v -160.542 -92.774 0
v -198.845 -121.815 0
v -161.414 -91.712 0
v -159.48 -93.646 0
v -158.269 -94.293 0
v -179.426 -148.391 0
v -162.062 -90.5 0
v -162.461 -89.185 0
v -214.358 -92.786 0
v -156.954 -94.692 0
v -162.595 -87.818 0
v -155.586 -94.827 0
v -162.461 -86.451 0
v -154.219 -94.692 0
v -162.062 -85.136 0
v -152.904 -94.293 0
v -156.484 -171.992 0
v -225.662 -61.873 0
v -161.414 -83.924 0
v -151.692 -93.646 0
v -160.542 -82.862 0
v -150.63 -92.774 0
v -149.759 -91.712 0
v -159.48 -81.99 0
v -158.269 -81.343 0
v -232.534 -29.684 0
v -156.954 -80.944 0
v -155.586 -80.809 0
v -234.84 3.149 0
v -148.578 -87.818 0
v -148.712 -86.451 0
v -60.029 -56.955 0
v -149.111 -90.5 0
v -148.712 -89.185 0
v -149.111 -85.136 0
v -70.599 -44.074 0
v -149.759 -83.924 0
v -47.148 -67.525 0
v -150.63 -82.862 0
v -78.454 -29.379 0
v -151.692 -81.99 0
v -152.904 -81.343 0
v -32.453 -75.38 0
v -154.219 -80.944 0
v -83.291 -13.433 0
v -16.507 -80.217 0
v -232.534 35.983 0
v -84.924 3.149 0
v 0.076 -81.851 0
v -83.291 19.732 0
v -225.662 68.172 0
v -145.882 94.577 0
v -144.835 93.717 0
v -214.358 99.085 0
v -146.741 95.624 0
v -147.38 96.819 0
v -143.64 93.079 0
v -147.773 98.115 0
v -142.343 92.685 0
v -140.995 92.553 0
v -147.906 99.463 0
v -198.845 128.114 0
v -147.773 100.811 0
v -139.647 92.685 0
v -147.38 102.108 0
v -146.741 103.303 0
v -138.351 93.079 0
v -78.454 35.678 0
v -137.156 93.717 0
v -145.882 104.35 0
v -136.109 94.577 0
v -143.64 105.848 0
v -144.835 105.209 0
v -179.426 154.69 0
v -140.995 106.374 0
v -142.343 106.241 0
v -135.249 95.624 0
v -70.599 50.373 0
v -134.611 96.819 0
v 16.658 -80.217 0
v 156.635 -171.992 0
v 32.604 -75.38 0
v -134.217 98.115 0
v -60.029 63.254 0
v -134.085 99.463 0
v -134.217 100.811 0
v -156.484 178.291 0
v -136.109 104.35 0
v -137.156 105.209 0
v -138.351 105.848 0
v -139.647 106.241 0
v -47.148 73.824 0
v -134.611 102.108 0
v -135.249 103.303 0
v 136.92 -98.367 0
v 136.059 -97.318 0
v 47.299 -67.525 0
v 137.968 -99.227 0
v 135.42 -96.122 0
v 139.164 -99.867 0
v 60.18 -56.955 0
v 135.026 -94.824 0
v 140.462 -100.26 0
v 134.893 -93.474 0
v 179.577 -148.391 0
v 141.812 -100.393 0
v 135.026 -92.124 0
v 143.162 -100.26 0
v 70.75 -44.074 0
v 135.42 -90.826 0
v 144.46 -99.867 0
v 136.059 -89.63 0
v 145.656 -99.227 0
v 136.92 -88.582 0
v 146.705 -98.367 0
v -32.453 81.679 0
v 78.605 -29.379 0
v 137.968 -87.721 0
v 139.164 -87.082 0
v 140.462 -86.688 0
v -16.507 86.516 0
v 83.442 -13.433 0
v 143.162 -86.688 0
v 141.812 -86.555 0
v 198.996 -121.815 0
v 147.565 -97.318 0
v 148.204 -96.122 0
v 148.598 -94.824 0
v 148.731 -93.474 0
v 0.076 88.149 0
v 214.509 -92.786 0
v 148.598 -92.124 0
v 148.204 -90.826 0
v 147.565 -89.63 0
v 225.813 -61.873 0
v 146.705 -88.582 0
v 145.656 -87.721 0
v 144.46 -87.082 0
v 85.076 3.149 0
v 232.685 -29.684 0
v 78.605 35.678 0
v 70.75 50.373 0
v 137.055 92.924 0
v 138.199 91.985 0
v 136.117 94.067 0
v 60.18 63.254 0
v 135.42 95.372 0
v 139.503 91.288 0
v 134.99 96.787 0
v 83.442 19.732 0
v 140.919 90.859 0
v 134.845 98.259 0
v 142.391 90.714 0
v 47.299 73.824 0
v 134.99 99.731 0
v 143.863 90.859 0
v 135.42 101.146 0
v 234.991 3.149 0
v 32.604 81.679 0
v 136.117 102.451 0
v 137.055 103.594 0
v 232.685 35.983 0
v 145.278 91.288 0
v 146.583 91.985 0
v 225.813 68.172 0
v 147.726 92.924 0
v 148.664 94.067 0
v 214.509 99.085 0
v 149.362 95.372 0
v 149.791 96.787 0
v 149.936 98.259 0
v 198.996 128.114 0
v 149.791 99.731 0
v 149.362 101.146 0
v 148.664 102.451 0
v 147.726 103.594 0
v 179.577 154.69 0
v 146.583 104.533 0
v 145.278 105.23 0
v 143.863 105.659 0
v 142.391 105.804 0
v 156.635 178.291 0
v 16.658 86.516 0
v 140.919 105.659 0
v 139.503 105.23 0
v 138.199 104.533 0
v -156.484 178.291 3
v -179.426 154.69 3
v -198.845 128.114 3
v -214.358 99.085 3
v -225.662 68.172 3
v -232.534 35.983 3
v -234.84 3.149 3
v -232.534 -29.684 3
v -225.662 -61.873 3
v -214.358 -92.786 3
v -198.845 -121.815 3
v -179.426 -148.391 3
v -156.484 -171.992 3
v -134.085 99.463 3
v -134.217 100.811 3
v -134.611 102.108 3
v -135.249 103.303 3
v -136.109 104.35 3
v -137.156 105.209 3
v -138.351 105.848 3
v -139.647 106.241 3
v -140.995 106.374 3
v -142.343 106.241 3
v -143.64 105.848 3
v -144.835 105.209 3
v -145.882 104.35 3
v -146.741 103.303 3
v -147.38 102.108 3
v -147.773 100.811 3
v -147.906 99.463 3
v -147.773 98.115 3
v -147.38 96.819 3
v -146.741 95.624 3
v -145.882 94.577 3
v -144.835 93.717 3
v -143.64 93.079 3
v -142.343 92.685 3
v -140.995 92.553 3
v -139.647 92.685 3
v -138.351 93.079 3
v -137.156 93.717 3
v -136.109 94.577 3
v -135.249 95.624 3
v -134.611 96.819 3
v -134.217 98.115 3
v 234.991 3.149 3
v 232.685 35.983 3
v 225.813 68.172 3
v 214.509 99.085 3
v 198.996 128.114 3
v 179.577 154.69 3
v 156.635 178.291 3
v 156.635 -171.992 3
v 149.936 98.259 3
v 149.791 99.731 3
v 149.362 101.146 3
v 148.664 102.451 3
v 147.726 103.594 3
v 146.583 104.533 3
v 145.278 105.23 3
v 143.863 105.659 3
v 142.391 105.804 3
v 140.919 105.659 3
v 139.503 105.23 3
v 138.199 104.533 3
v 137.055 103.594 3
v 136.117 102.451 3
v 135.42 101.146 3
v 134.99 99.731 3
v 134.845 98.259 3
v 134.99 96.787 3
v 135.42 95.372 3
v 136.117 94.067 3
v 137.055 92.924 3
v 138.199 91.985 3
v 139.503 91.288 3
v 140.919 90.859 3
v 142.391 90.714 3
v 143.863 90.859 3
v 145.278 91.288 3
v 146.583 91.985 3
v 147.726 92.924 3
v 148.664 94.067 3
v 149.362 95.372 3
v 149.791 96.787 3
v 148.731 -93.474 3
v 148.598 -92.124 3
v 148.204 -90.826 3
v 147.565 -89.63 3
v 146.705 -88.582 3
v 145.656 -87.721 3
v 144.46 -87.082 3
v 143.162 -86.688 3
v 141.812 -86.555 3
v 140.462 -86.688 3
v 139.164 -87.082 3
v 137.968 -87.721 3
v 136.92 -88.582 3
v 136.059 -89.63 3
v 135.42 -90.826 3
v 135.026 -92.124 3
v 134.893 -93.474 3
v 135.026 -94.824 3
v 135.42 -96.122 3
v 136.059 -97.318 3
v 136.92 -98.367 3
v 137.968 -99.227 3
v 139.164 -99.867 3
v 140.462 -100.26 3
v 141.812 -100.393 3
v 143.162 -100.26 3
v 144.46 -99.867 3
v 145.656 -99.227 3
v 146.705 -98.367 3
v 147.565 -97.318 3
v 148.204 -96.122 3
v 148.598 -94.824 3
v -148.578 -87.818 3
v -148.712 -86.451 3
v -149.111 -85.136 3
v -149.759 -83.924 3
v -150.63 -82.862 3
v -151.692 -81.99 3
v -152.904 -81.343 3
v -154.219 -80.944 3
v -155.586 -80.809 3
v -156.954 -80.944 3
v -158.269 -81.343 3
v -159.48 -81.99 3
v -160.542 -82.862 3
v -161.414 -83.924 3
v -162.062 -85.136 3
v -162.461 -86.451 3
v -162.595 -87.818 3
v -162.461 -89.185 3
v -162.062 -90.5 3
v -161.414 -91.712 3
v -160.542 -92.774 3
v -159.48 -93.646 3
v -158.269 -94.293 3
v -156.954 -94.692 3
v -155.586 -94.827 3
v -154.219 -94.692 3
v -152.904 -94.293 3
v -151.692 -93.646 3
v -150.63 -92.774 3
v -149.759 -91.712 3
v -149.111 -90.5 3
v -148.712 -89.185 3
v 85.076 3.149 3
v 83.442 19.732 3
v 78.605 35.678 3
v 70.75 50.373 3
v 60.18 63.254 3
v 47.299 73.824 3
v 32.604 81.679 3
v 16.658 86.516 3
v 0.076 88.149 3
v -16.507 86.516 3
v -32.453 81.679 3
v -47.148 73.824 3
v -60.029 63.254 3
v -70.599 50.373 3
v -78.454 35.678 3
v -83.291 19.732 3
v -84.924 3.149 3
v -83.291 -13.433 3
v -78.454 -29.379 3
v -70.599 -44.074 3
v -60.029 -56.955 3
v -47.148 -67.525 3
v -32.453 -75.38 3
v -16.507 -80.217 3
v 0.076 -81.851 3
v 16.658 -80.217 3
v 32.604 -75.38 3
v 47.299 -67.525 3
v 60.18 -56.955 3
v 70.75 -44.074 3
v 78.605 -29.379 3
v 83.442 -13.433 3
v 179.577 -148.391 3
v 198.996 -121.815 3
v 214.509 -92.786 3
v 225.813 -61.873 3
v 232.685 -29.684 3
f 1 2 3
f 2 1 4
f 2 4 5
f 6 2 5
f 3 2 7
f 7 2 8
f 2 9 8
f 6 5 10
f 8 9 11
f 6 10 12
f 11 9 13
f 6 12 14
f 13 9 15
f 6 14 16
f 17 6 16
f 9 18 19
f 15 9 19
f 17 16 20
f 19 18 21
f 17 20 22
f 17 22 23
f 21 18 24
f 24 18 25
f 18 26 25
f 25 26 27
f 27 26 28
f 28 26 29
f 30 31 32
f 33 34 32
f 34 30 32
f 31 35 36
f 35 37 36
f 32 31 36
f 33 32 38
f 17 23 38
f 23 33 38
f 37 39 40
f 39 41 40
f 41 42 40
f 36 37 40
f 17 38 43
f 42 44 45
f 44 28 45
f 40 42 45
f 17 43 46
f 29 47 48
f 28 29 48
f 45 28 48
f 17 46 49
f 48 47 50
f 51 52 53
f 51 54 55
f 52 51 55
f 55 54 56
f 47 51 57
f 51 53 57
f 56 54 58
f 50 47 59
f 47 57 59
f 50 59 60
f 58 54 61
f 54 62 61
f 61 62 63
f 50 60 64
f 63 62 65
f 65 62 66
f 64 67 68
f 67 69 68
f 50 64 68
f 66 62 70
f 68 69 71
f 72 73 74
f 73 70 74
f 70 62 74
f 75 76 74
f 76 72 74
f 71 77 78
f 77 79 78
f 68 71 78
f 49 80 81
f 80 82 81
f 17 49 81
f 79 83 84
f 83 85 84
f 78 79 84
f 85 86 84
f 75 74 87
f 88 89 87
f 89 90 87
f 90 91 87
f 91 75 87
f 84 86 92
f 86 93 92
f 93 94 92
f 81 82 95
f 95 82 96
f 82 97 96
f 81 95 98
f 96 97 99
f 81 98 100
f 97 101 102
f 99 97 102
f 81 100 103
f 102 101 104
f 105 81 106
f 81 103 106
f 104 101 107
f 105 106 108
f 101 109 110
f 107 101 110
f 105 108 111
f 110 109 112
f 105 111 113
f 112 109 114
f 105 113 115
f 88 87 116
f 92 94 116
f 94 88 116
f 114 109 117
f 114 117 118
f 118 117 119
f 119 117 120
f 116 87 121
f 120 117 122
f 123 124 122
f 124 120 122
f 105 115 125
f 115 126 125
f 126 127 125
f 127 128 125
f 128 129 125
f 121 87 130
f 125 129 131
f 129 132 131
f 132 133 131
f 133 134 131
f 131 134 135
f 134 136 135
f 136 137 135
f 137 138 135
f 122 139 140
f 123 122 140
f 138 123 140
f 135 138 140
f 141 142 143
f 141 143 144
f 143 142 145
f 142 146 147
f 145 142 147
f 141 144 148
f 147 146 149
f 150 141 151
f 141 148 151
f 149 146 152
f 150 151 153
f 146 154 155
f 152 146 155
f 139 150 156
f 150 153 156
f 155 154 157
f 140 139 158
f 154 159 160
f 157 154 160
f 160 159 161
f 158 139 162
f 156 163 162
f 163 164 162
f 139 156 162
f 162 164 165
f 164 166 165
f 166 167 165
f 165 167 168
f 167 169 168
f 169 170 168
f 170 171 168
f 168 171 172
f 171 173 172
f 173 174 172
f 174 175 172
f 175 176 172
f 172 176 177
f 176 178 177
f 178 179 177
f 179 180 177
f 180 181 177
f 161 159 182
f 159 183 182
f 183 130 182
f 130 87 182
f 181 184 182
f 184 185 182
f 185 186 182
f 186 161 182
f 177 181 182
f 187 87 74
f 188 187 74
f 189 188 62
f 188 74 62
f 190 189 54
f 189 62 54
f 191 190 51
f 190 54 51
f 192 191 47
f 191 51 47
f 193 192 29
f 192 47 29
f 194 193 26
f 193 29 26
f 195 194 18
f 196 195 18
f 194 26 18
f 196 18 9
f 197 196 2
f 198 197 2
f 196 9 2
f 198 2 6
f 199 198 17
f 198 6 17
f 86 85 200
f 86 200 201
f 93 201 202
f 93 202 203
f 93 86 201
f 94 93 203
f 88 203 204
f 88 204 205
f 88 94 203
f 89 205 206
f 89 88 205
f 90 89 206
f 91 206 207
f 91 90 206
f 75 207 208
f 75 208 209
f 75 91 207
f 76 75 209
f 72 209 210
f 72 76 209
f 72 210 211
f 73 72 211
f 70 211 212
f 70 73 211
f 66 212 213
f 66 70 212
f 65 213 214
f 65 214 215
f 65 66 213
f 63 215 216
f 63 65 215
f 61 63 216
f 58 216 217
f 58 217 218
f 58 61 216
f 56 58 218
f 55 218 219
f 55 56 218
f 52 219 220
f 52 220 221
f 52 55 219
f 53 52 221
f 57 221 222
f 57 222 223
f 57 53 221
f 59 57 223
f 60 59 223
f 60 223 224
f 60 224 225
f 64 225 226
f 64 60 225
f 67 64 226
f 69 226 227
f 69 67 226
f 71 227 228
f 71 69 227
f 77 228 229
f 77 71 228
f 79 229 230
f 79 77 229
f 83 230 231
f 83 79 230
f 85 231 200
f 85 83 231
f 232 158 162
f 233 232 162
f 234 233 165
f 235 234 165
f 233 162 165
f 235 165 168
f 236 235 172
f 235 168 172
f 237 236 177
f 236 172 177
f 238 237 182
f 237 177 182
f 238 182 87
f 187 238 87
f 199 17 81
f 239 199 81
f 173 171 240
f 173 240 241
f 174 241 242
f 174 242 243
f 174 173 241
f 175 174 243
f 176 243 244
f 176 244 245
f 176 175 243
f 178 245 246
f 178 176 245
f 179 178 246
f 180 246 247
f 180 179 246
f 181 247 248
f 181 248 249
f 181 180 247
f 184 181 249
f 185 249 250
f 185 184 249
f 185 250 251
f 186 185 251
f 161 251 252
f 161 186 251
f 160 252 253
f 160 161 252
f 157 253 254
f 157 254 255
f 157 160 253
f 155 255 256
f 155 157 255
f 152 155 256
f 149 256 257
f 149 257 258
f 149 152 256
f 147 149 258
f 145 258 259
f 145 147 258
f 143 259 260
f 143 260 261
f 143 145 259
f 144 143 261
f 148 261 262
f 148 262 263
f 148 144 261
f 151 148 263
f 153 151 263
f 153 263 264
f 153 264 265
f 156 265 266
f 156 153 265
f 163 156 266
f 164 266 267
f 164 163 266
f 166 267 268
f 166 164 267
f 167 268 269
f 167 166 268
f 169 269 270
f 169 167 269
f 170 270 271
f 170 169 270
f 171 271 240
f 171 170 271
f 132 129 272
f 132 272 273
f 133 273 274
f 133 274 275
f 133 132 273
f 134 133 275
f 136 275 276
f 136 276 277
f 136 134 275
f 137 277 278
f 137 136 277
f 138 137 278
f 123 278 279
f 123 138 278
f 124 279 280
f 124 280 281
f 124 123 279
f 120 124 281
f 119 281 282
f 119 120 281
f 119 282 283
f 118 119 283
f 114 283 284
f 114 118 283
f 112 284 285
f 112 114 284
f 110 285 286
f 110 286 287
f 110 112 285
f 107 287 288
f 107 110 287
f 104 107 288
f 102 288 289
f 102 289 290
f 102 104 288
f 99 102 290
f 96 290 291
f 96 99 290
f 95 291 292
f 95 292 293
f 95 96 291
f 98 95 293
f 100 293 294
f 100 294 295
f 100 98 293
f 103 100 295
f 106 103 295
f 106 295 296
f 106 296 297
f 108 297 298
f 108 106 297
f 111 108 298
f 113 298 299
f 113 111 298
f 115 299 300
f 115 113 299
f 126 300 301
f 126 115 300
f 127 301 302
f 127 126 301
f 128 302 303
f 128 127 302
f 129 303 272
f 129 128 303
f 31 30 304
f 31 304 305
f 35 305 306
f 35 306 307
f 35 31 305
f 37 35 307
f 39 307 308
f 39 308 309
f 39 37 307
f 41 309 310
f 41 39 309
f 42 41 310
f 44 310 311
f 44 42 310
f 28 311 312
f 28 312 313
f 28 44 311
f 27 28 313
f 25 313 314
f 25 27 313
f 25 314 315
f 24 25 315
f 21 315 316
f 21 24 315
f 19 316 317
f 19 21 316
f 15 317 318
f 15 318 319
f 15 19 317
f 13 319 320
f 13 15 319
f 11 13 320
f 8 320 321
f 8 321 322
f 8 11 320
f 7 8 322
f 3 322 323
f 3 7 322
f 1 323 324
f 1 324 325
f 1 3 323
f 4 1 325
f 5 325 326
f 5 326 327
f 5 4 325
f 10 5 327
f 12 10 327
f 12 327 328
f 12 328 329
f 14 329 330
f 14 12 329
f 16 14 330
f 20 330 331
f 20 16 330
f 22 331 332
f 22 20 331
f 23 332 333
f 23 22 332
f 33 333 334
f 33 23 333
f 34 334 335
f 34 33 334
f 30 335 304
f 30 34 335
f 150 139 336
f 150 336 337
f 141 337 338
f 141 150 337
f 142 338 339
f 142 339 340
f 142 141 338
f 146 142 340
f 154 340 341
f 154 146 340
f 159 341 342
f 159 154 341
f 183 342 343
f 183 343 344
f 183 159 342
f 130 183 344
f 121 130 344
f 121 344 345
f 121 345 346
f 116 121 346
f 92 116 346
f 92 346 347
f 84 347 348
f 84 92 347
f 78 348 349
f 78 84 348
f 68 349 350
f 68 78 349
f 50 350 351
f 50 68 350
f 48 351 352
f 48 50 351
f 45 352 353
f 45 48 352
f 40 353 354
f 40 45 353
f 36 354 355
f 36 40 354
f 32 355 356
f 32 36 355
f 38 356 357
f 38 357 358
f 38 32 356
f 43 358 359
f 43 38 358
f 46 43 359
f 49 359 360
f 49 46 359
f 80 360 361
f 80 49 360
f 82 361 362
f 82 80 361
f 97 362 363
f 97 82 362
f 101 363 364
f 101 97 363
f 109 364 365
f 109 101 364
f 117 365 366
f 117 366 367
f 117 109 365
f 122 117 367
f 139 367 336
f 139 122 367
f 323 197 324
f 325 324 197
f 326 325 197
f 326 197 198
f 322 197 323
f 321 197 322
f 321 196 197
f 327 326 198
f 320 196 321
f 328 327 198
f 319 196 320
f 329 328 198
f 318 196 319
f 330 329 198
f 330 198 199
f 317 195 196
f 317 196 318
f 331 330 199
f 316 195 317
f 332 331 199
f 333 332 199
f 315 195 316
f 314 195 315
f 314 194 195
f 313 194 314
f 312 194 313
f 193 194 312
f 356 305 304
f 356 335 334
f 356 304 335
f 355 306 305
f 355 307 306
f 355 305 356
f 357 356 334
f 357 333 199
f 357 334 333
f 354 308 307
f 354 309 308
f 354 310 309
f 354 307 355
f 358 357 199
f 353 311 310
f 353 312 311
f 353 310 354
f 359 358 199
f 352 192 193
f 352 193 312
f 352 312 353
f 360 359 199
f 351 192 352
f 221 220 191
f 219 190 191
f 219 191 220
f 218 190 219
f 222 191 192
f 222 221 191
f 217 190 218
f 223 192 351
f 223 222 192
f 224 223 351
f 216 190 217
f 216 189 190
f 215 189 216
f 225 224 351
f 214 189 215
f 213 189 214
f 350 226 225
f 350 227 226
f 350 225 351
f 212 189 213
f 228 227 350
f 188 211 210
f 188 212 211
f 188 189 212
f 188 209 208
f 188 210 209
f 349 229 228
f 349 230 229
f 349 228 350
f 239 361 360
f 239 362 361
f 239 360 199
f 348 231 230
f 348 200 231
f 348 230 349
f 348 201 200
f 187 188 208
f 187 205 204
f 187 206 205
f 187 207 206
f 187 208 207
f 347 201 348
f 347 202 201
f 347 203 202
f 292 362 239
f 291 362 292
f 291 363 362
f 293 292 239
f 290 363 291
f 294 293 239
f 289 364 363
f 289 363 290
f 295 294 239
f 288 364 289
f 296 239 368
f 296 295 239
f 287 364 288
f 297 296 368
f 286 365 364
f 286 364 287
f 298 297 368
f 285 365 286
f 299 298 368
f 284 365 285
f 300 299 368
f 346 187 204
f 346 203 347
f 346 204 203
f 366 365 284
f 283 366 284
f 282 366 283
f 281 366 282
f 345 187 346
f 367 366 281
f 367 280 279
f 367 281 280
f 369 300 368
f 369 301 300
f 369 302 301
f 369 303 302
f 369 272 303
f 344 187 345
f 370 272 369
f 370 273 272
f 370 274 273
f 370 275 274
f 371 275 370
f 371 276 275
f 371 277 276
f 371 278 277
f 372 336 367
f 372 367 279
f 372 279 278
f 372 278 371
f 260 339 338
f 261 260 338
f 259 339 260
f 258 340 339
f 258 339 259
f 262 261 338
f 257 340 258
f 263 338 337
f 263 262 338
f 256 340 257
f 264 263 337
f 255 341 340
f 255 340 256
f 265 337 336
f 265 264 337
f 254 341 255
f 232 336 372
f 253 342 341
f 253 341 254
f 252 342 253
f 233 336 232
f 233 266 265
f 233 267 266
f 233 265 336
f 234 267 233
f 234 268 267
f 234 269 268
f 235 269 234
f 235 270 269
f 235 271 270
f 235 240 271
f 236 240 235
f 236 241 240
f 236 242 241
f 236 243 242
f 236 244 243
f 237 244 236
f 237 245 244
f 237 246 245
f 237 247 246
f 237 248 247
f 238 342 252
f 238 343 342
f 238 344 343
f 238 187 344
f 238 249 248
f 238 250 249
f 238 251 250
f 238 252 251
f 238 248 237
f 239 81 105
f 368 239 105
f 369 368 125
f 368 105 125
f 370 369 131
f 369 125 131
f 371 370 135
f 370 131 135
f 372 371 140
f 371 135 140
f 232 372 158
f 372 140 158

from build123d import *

# Parameters (mm, degrees)
F1_R     = 7.008857
F1_R_2   = 6.918989
F1_R_3   = 6.910628
F1_R_4   = 85
F1_R_5   = 7.545233
F2_DEPTH = 3


with BuildPart() as f2:
    # F1 (on Top) → F2 (new body)
    with BuildSketch(Plane.XY):
        with BuildLine():
            ThreePointArc((133.07327, 178.290789), (197.066851, 100.910925), (219.991151, 3.14949))
            ThreePointArc((219.991151, 3.14949), (197.066851, -94.611945), (133.07327, -171.991809))
            Line((133.07327, -171.991809), (156.635002, -171.991809))
            ThreePointArc((156.635002, -171.991809), (214.509219, -92.785593), (234.991151, 3.14949))
            ThreePointArc((234.991151, 3.14949), (214.509219, 99.084573), (156.635002, 178.290789))
            Line((156.635002, 178.290789), (133.07327, 178.290789))
        make_face()
        with BuildLine():
            ThreePointArc((-132.922132, -171.991809), (-219.840013, 3.14949), (-132.922132, 178.290789))
            Line((-132.922132, 178.290789), (-156.483864, 178.290789))
            ThreePointArc((-156.483864, 178.290789), (-234.840013, 3.14949), (-156.483864, -171.991809))
            Line((-156.483864, -171.991809), (-132.922132, -171.991809))
        make_face()
        with BuildLine():
            ThreePointArc((133.07327, -171.991809), (197.066851, -94.611945), (219.991151, 3.14949))
            ThreePointArc((219.991151, 3.14949), (197.066851, 100.910925), (133.07327, 178.290789))
            Line((133.07327, 178.290789), (-132.922132, 178.290789))
            ThreePointArc((-132.922132, 178.290789), (-219.840013, 3.14949), (-132.922132, -171.991809))
            Line((-132.922132, -171.991809), (133.07327, -171.991809))
        make_face()
        with Locations((-155.586369, -87.818066)):
            Circle(F1_R, mode=Mode.SUBTRACT)
        with Locations((141.81215, -93.474258)):
            Circle(F1_R_2, mode=Mode.SUBTRACT)
        with Locations((-140.995276, 99.463245)):
            Circle(F1_R_3, mode=Mode.SUBTRACT)
        with Locations((0.075569, 3.14949)):
            Circle(F1_R_4, mode=Mode.SUBTRACT)
        with Locations((142.390701, 98.258993)):
            Circle(F1_R_5, mode=Mode.SUBTRACT)
    extrude(amount=F2_DEPTH)


solid = f2.part
